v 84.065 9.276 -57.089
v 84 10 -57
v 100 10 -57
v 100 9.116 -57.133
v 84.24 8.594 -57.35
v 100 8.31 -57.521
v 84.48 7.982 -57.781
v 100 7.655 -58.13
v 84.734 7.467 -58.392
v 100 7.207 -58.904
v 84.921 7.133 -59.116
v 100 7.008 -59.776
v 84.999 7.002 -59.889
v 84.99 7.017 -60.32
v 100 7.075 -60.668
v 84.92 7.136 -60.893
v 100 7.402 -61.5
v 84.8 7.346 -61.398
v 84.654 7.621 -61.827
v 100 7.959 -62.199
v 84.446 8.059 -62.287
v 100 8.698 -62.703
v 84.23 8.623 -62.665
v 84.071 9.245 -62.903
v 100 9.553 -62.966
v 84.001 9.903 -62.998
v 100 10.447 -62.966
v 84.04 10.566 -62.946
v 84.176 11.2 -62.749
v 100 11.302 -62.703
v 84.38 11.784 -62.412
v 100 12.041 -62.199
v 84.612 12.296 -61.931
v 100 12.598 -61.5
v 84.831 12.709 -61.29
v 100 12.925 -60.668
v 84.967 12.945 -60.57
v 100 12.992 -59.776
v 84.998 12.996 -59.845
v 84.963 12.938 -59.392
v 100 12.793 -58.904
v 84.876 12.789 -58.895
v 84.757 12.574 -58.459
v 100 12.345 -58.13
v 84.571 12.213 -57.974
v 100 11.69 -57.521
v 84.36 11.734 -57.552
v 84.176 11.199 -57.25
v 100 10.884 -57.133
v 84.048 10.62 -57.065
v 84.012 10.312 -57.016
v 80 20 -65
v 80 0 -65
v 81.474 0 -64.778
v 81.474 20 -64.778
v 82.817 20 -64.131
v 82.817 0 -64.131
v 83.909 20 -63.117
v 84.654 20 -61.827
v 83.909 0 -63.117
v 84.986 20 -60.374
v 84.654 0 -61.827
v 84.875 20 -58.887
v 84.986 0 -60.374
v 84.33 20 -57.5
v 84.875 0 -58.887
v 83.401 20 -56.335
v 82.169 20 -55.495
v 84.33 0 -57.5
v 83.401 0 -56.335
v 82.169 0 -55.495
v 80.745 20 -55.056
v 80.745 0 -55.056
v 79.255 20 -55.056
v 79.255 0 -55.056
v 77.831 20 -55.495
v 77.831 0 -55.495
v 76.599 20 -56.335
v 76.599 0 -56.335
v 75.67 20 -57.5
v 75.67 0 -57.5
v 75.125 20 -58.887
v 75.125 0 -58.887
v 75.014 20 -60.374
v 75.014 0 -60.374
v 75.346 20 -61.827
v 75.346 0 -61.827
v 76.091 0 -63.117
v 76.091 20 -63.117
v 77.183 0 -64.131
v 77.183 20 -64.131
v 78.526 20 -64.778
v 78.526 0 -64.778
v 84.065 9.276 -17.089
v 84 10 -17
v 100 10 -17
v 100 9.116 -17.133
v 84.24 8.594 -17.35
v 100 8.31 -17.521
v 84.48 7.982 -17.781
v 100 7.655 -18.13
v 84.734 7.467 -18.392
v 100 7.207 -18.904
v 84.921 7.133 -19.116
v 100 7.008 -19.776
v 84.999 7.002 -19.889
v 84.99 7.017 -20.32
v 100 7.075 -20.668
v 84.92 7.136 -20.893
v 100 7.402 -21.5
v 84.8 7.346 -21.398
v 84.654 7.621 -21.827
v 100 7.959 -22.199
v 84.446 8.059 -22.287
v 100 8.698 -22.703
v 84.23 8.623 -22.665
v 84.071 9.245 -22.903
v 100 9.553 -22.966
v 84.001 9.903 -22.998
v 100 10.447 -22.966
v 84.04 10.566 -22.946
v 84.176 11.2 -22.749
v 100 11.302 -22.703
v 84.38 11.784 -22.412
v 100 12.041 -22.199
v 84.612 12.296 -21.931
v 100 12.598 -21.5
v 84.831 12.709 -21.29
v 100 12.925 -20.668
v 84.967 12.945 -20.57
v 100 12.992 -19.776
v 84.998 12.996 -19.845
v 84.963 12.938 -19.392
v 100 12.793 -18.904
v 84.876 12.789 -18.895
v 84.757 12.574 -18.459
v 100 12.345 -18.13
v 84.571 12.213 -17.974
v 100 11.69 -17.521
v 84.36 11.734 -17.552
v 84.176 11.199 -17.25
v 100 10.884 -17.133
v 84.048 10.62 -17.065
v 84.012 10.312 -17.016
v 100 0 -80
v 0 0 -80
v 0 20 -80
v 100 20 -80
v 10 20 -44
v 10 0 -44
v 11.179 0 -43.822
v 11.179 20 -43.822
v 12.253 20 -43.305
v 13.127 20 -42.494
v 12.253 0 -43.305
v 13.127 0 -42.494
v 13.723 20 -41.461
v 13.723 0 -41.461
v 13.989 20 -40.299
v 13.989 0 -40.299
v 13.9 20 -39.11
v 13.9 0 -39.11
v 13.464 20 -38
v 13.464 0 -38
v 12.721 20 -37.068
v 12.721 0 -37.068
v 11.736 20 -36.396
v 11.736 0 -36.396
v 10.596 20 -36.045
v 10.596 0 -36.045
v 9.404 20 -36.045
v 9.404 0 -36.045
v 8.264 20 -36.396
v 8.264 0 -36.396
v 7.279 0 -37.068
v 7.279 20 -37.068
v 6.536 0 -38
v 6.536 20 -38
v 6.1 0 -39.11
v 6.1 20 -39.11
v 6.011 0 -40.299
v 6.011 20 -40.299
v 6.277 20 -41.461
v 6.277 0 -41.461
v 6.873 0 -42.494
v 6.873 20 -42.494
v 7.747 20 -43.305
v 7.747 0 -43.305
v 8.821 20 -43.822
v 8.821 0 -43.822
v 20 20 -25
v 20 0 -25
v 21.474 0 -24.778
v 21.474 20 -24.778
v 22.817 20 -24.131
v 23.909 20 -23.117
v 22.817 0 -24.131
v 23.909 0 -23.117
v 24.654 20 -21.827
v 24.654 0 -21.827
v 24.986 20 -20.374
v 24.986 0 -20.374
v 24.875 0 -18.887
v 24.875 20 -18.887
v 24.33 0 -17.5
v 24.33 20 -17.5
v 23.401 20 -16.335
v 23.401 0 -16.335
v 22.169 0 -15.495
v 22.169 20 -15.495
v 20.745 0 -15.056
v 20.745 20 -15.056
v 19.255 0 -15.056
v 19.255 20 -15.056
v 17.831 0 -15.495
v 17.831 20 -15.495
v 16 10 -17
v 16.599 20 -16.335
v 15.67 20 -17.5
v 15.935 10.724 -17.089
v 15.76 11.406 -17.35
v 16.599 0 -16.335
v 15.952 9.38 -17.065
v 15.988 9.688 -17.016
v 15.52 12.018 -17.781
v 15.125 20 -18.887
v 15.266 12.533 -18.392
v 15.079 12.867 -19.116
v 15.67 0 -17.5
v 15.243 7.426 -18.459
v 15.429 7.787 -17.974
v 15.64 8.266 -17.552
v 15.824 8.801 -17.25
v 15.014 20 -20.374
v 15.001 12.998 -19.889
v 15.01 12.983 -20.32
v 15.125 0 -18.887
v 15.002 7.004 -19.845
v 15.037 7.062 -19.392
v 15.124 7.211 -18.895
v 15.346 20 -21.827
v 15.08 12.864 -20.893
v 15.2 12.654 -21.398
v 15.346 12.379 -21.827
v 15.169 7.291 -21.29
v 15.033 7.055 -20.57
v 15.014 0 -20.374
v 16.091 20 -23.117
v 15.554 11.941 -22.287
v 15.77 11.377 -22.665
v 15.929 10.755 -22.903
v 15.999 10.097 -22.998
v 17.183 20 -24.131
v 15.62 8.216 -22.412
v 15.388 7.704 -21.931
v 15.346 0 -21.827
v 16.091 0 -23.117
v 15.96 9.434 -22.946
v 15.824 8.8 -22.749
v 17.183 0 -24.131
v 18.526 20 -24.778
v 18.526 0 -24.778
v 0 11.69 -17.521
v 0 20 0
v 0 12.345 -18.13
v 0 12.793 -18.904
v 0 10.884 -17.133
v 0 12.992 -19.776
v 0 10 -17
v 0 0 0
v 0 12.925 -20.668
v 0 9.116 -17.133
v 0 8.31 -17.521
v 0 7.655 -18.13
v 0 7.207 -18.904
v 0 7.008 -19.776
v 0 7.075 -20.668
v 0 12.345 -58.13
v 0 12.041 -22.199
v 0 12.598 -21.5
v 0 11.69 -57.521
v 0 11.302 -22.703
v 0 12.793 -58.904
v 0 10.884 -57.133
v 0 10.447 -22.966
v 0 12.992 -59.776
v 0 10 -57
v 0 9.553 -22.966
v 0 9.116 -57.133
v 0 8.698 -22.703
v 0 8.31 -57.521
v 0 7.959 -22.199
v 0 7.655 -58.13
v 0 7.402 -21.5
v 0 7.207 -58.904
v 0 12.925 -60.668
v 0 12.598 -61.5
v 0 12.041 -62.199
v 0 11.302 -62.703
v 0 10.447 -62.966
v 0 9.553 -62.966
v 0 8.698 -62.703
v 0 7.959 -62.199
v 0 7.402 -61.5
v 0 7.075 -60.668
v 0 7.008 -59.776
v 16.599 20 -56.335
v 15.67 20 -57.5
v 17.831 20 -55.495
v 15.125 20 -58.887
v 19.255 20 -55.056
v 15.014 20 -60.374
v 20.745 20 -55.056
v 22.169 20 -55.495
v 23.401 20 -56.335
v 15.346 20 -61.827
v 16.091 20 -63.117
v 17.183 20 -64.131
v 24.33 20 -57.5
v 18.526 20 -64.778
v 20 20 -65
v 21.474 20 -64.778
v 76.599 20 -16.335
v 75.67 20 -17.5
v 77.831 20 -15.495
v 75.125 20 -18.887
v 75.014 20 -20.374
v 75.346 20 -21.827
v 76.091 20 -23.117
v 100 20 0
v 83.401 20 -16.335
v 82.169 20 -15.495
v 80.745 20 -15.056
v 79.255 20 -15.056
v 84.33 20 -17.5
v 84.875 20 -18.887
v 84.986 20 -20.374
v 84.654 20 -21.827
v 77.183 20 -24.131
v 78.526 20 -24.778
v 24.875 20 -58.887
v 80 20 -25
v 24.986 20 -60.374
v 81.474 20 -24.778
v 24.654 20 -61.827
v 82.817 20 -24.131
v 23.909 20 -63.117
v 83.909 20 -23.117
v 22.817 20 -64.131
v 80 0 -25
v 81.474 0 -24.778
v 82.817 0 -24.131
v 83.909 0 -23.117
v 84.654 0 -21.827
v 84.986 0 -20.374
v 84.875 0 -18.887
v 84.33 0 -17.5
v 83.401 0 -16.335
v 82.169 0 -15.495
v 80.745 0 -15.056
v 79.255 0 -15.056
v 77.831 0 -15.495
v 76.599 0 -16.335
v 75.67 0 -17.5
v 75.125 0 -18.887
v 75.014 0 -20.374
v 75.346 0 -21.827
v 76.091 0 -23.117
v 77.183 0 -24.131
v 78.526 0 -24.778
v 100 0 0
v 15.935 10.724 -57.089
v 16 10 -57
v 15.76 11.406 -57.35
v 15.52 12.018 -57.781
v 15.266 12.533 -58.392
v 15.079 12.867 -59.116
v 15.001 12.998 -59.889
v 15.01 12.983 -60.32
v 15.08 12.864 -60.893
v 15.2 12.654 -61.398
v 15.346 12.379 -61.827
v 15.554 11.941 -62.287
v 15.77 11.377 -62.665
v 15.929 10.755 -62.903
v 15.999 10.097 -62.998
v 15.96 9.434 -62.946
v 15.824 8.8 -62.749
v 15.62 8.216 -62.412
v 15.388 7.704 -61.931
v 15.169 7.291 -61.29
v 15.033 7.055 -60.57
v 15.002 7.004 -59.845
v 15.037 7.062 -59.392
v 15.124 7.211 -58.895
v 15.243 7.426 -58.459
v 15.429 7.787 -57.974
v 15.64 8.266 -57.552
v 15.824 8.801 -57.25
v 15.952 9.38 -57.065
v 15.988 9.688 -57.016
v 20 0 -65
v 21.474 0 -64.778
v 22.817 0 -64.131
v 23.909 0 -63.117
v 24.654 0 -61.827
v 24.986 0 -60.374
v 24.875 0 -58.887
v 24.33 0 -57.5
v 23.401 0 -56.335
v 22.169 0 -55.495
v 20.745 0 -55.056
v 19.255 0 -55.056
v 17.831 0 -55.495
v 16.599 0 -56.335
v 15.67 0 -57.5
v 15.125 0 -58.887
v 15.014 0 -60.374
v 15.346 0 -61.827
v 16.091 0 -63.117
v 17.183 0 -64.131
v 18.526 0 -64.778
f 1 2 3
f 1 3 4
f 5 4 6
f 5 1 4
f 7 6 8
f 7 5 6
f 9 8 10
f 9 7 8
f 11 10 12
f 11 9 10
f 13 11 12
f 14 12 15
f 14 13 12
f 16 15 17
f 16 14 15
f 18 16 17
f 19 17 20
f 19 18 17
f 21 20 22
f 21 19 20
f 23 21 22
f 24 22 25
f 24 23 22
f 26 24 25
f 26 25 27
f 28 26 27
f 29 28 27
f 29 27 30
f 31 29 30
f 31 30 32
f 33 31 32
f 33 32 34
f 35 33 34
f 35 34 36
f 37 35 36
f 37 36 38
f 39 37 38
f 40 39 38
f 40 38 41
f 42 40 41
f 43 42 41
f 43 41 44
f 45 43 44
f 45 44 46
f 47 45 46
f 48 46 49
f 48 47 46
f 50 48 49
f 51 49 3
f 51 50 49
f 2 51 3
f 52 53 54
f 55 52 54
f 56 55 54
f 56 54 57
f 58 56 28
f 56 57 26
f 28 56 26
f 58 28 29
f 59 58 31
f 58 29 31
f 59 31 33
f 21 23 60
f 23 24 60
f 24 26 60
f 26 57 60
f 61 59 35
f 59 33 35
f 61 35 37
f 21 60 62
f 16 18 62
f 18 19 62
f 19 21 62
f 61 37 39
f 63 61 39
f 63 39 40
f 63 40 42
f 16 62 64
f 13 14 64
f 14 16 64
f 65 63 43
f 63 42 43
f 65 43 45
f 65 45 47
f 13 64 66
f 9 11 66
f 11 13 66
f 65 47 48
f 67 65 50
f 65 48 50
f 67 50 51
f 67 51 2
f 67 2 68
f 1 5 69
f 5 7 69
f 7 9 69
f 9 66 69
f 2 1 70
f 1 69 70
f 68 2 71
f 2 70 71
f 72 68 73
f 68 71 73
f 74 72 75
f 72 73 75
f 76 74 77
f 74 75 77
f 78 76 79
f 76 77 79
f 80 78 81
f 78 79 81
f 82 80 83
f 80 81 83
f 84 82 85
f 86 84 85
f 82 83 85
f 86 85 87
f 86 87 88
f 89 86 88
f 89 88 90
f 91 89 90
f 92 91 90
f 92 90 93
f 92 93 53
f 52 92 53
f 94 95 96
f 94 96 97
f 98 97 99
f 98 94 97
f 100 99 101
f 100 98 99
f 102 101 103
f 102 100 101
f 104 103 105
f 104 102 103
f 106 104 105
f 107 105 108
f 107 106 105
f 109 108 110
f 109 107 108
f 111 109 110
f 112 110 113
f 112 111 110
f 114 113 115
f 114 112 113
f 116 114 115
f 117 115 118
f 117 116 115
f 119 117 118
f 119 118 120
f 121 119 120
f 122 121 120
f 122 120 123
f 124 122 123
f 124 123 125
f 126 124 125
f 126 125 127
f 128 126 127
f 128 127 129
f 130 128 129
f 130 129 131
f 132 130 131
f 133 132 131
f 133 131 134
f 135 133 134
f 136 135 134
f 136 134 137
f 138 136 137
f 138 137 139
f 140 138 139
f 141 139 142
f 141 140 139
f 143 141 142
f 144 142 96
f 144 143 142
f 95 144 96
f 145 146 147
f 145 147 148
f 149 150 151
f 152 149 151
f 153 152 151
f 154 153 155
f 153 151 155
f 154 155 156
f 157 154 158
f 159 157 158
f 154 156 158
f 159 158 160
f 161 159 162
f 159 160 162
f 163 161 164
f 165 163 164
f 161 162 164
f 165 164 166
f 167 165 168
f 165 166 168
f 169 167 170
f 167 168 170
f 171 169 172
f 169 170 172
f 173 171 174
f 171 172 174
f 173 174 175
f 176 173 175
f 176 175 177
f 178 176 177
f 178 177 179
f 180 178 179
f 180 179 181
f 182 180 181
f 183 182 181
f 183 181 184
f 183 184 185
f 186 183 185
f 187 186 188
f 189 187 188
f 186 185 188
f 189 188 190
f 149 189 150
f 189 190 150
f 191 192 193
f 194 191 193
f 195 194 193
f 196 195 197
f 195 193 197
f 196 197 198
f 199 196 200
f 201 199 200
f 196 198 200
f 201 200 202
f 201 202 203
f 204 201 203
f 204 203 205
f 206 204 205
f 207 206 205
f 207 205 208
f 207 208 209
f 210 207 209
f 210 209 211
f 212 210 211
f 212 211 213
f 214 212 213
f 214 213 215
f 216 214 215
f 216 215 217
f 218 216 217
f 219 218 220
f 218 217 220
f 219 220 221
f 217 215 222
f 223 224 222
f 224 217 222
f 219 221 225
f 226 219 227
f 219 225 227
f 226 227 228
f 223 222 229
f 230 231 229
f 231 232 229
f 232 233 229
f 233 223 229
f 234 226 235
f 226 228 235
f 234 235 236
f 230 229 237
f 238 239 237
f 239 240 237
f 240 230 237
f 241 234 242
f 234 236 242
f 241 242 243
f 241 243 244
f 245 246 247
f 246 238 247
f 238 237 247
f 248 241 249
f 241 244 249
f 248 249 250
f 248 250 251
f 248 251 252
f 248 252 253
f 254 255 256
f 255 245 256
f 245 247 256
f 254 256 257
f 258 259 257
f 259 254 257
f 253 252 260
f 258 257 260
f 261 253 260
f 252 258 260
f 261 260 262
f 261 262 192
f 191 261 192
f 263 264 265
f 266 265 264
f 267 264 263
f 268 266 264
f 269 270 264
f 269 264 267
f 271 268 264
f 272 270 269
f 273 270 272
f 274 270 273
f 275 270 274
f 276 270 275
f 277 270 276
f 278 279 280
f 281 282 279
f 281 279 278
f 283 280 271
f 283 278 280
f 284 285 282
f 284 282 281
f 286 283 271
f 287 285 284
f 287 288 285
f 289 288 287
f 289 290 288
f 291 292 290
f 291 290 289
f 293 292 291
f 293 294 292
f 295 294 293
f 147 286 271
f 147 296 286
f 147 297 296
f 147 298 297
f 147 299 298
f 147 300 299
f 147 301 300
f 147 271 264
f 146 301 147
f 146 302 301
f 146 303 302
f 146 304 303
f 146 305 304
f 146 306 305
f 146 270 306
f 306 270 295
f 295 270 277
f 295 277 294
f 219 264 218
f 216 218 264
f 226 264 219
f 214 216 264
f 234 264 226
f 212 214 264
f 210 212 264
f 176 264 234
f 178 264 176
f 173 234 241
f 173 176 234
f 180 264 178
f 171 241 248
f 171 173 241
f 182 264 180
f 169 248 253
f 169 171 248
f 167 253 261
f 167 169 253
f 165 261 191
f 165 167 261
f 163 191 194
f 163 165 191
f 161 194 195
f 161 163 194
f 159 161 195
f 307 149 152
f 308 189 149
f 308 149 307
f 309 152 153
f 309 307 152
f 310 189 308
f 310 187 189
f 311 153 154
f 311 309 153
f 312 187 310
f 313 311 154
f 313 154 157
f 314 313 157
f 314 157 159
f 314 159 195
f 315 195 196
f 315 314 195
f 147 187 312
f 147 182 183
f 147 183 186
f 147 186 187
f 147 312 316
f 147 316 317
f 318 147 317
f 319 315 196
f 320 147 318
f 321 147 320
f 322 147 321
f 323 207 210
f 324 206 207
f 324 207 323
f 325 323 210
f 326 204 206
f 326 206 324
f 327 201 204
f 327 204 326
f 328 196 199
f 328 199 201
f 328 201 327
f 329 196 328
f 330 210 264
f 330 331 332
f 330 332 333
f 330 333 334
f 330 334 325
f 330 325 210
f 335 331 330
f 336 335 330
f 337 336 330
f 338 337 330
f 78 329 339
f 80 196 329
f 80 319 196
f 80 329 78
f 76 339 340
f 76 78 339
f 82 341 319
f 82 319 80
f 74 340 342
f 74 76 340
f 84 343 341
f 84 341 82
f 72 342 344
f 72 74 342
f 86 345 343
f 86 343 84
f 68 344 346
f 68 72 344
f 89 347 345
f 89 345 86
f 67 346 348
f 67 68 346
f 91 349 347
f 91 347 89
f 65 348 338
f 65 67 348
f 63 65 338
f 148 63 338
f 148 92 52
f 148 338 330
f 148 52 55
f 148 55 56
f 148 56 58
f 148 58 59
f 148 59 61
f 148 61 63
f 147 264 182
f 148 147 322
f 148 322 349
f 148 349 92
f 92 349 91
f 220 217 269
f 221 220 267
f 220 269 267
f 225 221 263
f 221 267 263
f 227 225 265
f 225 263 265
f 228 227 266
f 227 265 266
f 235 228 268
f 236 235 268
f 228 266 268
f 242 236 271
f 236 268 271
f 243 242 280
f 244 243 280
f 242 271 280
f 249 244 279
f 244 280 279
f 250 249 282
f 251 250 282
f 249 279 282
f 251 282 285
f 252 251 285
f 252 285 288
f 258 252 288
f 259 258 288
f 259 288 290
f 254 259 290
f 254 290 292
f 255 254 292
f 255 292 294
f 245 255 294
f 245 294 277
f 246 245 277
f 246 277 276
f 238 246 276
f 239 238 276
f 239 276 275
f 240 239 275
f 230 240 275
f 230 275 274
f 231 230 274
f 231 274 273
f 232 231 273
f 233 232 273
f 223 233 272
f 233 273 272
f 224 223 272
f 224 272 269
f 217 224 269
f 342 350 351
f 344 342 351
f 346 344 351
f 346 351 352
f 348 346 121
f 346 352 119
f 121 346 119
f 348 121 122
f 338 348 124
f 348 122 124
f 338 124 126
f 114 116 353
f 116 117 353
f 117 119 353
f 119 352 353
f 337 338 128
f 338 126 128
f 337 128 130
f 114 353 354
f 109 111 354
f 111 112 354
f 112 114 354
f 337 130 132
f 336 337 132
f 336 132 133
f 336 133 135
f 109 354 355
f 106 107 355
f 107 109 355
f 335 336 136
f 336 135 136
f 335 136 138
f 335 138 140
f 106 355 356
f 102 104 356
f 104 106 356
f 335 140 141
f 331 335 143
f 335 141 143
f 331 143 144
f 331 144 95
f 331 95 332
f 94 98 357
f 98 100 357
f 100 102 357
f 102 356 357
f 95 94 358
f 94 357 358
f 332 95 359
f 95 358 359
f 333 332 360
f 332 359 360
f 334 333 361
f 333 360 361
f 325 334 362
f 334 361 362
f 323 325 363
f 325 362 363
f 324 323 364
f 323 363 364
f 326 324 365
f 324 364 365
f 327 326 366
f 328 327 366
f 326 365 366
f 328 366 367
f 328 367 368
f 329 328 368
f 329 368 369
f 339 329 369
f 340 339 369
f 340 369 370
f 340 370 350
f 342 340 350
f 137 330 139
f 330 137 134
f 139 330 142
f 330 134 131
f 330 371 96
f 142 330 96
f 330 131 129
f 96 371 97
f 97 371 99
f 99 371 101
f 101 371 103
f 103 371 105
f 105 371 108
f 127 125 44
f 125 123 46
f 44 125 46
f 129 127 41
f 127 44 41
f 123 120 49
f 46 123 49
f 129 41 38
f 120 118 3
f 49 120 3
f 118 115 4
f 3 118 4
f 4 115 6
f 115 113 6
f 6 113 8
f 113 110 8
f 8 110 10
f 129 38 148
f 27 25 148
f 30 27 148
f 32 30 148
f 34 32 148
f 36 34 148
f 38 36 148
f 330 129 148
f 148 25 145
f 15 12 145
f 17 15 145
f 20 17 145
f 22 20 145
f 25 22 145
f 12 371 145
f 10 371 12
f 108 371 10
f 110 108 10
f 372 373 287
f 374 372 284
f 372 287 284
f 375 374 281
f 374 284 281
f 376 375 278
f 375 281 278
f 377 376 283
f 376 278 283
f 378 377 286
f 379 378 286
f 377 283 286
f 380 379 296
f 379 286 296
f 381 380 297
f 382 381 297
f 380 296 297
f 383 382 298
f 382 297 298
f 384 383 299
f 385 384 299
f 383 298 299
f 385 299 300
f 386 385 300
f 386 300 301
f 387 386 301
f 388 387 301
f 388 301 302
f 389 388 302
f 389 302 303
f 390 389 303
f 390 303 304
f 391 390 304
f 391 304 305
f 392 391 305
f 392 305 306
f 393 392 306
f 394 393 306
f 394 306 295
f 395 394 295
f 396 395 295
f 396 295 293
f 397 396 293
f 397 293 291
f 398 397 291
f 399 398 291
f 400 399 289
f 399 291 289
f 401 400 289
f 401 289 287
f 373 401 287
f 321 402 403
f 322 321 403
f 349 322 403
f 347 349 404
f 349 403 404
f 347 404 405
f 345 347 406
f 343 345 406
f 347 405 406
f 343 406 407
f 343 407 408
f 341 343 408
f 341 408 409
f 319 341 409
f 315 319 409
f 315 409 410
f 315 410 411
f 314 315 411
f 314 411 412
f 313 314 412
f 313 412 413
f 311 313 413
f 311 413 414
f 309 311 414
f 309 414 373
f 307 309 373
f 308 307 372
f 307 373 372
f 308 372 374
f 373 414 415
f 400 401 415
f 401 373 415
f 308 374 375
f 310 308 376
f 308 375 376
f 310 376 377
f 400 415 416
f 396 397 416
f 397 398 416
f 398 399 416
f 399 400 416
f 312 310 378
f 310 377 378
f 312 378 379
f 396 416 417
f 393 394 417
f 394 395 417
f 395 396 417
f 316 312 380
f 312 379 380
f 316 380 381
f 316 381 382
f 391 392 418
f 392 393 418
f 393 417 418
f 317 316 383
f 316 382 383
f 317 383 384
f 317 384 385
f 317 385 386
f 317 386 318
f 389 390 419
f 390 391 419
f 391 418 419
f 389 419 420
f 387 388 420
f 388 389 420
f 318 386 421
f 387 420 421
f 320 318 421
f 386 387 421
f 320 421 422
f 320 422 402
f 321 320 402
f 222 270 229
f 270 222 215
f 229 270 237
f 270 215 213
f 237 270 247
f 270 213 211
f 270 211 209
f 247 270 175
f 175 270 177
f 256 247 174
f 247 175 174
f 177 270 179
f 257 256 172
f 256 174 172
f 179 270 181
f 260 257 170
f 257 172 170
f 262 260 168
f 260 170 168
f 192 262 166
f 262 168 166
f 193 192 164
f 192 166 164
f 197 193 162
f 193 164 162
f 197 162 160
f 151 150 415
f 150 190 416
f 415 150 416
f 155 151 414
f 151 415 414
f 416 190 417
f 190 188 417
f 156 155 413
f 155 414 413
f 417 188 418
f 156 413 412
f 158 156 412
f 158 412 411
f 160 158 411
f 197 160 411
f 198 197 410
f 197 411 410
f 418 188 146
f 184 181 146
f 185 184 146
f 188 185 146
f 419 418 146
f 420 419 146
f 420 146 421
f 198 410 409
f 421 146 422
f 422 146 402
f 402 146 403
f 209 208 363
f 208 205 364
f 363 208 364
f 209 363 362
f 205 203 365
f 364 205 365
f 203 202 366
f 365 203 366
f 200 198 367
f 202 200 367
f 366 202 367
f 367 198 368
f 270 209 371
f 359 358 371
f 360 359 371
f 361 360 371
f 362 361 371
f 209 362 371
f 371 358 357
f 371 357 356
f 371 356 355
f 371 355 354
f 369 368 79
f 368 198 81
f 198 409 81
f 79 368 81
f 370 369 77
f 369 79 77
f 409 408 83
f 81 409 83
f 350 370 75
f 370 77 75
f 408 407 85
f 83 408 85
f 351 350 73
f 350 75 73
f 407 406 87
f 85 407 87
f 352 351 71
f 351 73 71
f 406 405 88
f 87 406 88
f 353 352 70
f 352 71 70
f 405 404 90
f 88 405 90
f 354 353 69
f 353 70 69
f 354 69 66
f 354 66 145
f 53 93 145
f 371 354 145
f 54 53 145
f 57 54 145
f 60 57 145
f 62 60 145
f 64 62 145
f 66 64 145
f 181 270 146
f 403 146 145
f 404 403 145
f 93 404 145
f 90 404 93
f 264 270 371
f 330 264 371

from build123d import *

# Parameters (mm, degrees)
SKETCH_1_W          = 100
SKETCH_1_H          = 80
EXTRUDE_1_DEPTH     = 20
SKETCH_2_R          = 5
SKETCH_2_R_2        = 4
CUT_EXTRUDE_1_DEPTH = 20
SKETCH_3_R          = 3
CUT_EXTRUDE_2_DEPTH = 20
CUT_EXTRUDE_START   = -20
SKETCH_4_R          = 3
CUT_EXTRUDE_3_DEPTH = 20


with BuildPart() as part:
    # Эскиз1 → Бобышка-Вытянуть1 (new body)
    with BuildSketch(Plane(origin=(0, 0, 0), x_dir=(1, 0, 0), z_dir=(0, 1, 0))):
        with Locations((50, 40)):
            Rectangle(SKETCH_1_W, SKETCH_1_H)
    extrude(amount=EXTRUDE_1_DEPTH)

    # Эскиз2 → Вырез-Вытянуть1 (cut)
    with BuildSketch(Plane.XZ):
        with Locations(Location((20, -20, 0), (0, 0, 270))):
            Circle(SKETCH_2_R)
        with Locations(Location((10, -40, 0), (0, 0, 270))):
            Circle(SKETCH_2_R_2)
        with Locations(Location((20, -60, 0), (0, 0, 270))):
            Circle(SKETCH_2_R)
        with Locations(Location((80, -20, 0), (0, 0, 270))):
            Circle(SKETCH_2_R)
        with Locations(Location((80, -60, 0), (0, 0, 270))):
            Circle(SKETCH_2_R)
    extrude(amount=-CUT_EXTRUDE_1_DEPTH, mode=Mode.SUBTRACT)

    # Эскиз3 → Вырез-Вытянуть2 (cut)
    with BuildSketch(Plane.ZY):
        with Locations((-60, 10)):
            Circle(SKETCH_3_R)
        with Locations((-20, 10)):
            Circle(SKETCH_3_R)
    extrude(amount=-CUT_EXTRUDE_2_DEPTH, mode=Mode.SUBTRACT)

    # Эскиз4 → Вырез-Вытянуть3 (cut)
    with BuildSketch(Plane(origin=(100, 0, 0), x_dir=(0, 0, -1), z_dir=(1, 0, 0)).offset(CUT_EXTRUDE_START)):
        with Locations(Location((20, 10, 0), (0, 0, 180))):
            Circle(SKETCH_4_R)
        with Locations(Location((60, 10, 0), (0, 0, 180))):
            Circle(SKETCH_4_R)
    extrude(amount=CUT_EXTRUDE_3_DEPTH, mode=Mode.SUBTRACT)


solid = part.part
